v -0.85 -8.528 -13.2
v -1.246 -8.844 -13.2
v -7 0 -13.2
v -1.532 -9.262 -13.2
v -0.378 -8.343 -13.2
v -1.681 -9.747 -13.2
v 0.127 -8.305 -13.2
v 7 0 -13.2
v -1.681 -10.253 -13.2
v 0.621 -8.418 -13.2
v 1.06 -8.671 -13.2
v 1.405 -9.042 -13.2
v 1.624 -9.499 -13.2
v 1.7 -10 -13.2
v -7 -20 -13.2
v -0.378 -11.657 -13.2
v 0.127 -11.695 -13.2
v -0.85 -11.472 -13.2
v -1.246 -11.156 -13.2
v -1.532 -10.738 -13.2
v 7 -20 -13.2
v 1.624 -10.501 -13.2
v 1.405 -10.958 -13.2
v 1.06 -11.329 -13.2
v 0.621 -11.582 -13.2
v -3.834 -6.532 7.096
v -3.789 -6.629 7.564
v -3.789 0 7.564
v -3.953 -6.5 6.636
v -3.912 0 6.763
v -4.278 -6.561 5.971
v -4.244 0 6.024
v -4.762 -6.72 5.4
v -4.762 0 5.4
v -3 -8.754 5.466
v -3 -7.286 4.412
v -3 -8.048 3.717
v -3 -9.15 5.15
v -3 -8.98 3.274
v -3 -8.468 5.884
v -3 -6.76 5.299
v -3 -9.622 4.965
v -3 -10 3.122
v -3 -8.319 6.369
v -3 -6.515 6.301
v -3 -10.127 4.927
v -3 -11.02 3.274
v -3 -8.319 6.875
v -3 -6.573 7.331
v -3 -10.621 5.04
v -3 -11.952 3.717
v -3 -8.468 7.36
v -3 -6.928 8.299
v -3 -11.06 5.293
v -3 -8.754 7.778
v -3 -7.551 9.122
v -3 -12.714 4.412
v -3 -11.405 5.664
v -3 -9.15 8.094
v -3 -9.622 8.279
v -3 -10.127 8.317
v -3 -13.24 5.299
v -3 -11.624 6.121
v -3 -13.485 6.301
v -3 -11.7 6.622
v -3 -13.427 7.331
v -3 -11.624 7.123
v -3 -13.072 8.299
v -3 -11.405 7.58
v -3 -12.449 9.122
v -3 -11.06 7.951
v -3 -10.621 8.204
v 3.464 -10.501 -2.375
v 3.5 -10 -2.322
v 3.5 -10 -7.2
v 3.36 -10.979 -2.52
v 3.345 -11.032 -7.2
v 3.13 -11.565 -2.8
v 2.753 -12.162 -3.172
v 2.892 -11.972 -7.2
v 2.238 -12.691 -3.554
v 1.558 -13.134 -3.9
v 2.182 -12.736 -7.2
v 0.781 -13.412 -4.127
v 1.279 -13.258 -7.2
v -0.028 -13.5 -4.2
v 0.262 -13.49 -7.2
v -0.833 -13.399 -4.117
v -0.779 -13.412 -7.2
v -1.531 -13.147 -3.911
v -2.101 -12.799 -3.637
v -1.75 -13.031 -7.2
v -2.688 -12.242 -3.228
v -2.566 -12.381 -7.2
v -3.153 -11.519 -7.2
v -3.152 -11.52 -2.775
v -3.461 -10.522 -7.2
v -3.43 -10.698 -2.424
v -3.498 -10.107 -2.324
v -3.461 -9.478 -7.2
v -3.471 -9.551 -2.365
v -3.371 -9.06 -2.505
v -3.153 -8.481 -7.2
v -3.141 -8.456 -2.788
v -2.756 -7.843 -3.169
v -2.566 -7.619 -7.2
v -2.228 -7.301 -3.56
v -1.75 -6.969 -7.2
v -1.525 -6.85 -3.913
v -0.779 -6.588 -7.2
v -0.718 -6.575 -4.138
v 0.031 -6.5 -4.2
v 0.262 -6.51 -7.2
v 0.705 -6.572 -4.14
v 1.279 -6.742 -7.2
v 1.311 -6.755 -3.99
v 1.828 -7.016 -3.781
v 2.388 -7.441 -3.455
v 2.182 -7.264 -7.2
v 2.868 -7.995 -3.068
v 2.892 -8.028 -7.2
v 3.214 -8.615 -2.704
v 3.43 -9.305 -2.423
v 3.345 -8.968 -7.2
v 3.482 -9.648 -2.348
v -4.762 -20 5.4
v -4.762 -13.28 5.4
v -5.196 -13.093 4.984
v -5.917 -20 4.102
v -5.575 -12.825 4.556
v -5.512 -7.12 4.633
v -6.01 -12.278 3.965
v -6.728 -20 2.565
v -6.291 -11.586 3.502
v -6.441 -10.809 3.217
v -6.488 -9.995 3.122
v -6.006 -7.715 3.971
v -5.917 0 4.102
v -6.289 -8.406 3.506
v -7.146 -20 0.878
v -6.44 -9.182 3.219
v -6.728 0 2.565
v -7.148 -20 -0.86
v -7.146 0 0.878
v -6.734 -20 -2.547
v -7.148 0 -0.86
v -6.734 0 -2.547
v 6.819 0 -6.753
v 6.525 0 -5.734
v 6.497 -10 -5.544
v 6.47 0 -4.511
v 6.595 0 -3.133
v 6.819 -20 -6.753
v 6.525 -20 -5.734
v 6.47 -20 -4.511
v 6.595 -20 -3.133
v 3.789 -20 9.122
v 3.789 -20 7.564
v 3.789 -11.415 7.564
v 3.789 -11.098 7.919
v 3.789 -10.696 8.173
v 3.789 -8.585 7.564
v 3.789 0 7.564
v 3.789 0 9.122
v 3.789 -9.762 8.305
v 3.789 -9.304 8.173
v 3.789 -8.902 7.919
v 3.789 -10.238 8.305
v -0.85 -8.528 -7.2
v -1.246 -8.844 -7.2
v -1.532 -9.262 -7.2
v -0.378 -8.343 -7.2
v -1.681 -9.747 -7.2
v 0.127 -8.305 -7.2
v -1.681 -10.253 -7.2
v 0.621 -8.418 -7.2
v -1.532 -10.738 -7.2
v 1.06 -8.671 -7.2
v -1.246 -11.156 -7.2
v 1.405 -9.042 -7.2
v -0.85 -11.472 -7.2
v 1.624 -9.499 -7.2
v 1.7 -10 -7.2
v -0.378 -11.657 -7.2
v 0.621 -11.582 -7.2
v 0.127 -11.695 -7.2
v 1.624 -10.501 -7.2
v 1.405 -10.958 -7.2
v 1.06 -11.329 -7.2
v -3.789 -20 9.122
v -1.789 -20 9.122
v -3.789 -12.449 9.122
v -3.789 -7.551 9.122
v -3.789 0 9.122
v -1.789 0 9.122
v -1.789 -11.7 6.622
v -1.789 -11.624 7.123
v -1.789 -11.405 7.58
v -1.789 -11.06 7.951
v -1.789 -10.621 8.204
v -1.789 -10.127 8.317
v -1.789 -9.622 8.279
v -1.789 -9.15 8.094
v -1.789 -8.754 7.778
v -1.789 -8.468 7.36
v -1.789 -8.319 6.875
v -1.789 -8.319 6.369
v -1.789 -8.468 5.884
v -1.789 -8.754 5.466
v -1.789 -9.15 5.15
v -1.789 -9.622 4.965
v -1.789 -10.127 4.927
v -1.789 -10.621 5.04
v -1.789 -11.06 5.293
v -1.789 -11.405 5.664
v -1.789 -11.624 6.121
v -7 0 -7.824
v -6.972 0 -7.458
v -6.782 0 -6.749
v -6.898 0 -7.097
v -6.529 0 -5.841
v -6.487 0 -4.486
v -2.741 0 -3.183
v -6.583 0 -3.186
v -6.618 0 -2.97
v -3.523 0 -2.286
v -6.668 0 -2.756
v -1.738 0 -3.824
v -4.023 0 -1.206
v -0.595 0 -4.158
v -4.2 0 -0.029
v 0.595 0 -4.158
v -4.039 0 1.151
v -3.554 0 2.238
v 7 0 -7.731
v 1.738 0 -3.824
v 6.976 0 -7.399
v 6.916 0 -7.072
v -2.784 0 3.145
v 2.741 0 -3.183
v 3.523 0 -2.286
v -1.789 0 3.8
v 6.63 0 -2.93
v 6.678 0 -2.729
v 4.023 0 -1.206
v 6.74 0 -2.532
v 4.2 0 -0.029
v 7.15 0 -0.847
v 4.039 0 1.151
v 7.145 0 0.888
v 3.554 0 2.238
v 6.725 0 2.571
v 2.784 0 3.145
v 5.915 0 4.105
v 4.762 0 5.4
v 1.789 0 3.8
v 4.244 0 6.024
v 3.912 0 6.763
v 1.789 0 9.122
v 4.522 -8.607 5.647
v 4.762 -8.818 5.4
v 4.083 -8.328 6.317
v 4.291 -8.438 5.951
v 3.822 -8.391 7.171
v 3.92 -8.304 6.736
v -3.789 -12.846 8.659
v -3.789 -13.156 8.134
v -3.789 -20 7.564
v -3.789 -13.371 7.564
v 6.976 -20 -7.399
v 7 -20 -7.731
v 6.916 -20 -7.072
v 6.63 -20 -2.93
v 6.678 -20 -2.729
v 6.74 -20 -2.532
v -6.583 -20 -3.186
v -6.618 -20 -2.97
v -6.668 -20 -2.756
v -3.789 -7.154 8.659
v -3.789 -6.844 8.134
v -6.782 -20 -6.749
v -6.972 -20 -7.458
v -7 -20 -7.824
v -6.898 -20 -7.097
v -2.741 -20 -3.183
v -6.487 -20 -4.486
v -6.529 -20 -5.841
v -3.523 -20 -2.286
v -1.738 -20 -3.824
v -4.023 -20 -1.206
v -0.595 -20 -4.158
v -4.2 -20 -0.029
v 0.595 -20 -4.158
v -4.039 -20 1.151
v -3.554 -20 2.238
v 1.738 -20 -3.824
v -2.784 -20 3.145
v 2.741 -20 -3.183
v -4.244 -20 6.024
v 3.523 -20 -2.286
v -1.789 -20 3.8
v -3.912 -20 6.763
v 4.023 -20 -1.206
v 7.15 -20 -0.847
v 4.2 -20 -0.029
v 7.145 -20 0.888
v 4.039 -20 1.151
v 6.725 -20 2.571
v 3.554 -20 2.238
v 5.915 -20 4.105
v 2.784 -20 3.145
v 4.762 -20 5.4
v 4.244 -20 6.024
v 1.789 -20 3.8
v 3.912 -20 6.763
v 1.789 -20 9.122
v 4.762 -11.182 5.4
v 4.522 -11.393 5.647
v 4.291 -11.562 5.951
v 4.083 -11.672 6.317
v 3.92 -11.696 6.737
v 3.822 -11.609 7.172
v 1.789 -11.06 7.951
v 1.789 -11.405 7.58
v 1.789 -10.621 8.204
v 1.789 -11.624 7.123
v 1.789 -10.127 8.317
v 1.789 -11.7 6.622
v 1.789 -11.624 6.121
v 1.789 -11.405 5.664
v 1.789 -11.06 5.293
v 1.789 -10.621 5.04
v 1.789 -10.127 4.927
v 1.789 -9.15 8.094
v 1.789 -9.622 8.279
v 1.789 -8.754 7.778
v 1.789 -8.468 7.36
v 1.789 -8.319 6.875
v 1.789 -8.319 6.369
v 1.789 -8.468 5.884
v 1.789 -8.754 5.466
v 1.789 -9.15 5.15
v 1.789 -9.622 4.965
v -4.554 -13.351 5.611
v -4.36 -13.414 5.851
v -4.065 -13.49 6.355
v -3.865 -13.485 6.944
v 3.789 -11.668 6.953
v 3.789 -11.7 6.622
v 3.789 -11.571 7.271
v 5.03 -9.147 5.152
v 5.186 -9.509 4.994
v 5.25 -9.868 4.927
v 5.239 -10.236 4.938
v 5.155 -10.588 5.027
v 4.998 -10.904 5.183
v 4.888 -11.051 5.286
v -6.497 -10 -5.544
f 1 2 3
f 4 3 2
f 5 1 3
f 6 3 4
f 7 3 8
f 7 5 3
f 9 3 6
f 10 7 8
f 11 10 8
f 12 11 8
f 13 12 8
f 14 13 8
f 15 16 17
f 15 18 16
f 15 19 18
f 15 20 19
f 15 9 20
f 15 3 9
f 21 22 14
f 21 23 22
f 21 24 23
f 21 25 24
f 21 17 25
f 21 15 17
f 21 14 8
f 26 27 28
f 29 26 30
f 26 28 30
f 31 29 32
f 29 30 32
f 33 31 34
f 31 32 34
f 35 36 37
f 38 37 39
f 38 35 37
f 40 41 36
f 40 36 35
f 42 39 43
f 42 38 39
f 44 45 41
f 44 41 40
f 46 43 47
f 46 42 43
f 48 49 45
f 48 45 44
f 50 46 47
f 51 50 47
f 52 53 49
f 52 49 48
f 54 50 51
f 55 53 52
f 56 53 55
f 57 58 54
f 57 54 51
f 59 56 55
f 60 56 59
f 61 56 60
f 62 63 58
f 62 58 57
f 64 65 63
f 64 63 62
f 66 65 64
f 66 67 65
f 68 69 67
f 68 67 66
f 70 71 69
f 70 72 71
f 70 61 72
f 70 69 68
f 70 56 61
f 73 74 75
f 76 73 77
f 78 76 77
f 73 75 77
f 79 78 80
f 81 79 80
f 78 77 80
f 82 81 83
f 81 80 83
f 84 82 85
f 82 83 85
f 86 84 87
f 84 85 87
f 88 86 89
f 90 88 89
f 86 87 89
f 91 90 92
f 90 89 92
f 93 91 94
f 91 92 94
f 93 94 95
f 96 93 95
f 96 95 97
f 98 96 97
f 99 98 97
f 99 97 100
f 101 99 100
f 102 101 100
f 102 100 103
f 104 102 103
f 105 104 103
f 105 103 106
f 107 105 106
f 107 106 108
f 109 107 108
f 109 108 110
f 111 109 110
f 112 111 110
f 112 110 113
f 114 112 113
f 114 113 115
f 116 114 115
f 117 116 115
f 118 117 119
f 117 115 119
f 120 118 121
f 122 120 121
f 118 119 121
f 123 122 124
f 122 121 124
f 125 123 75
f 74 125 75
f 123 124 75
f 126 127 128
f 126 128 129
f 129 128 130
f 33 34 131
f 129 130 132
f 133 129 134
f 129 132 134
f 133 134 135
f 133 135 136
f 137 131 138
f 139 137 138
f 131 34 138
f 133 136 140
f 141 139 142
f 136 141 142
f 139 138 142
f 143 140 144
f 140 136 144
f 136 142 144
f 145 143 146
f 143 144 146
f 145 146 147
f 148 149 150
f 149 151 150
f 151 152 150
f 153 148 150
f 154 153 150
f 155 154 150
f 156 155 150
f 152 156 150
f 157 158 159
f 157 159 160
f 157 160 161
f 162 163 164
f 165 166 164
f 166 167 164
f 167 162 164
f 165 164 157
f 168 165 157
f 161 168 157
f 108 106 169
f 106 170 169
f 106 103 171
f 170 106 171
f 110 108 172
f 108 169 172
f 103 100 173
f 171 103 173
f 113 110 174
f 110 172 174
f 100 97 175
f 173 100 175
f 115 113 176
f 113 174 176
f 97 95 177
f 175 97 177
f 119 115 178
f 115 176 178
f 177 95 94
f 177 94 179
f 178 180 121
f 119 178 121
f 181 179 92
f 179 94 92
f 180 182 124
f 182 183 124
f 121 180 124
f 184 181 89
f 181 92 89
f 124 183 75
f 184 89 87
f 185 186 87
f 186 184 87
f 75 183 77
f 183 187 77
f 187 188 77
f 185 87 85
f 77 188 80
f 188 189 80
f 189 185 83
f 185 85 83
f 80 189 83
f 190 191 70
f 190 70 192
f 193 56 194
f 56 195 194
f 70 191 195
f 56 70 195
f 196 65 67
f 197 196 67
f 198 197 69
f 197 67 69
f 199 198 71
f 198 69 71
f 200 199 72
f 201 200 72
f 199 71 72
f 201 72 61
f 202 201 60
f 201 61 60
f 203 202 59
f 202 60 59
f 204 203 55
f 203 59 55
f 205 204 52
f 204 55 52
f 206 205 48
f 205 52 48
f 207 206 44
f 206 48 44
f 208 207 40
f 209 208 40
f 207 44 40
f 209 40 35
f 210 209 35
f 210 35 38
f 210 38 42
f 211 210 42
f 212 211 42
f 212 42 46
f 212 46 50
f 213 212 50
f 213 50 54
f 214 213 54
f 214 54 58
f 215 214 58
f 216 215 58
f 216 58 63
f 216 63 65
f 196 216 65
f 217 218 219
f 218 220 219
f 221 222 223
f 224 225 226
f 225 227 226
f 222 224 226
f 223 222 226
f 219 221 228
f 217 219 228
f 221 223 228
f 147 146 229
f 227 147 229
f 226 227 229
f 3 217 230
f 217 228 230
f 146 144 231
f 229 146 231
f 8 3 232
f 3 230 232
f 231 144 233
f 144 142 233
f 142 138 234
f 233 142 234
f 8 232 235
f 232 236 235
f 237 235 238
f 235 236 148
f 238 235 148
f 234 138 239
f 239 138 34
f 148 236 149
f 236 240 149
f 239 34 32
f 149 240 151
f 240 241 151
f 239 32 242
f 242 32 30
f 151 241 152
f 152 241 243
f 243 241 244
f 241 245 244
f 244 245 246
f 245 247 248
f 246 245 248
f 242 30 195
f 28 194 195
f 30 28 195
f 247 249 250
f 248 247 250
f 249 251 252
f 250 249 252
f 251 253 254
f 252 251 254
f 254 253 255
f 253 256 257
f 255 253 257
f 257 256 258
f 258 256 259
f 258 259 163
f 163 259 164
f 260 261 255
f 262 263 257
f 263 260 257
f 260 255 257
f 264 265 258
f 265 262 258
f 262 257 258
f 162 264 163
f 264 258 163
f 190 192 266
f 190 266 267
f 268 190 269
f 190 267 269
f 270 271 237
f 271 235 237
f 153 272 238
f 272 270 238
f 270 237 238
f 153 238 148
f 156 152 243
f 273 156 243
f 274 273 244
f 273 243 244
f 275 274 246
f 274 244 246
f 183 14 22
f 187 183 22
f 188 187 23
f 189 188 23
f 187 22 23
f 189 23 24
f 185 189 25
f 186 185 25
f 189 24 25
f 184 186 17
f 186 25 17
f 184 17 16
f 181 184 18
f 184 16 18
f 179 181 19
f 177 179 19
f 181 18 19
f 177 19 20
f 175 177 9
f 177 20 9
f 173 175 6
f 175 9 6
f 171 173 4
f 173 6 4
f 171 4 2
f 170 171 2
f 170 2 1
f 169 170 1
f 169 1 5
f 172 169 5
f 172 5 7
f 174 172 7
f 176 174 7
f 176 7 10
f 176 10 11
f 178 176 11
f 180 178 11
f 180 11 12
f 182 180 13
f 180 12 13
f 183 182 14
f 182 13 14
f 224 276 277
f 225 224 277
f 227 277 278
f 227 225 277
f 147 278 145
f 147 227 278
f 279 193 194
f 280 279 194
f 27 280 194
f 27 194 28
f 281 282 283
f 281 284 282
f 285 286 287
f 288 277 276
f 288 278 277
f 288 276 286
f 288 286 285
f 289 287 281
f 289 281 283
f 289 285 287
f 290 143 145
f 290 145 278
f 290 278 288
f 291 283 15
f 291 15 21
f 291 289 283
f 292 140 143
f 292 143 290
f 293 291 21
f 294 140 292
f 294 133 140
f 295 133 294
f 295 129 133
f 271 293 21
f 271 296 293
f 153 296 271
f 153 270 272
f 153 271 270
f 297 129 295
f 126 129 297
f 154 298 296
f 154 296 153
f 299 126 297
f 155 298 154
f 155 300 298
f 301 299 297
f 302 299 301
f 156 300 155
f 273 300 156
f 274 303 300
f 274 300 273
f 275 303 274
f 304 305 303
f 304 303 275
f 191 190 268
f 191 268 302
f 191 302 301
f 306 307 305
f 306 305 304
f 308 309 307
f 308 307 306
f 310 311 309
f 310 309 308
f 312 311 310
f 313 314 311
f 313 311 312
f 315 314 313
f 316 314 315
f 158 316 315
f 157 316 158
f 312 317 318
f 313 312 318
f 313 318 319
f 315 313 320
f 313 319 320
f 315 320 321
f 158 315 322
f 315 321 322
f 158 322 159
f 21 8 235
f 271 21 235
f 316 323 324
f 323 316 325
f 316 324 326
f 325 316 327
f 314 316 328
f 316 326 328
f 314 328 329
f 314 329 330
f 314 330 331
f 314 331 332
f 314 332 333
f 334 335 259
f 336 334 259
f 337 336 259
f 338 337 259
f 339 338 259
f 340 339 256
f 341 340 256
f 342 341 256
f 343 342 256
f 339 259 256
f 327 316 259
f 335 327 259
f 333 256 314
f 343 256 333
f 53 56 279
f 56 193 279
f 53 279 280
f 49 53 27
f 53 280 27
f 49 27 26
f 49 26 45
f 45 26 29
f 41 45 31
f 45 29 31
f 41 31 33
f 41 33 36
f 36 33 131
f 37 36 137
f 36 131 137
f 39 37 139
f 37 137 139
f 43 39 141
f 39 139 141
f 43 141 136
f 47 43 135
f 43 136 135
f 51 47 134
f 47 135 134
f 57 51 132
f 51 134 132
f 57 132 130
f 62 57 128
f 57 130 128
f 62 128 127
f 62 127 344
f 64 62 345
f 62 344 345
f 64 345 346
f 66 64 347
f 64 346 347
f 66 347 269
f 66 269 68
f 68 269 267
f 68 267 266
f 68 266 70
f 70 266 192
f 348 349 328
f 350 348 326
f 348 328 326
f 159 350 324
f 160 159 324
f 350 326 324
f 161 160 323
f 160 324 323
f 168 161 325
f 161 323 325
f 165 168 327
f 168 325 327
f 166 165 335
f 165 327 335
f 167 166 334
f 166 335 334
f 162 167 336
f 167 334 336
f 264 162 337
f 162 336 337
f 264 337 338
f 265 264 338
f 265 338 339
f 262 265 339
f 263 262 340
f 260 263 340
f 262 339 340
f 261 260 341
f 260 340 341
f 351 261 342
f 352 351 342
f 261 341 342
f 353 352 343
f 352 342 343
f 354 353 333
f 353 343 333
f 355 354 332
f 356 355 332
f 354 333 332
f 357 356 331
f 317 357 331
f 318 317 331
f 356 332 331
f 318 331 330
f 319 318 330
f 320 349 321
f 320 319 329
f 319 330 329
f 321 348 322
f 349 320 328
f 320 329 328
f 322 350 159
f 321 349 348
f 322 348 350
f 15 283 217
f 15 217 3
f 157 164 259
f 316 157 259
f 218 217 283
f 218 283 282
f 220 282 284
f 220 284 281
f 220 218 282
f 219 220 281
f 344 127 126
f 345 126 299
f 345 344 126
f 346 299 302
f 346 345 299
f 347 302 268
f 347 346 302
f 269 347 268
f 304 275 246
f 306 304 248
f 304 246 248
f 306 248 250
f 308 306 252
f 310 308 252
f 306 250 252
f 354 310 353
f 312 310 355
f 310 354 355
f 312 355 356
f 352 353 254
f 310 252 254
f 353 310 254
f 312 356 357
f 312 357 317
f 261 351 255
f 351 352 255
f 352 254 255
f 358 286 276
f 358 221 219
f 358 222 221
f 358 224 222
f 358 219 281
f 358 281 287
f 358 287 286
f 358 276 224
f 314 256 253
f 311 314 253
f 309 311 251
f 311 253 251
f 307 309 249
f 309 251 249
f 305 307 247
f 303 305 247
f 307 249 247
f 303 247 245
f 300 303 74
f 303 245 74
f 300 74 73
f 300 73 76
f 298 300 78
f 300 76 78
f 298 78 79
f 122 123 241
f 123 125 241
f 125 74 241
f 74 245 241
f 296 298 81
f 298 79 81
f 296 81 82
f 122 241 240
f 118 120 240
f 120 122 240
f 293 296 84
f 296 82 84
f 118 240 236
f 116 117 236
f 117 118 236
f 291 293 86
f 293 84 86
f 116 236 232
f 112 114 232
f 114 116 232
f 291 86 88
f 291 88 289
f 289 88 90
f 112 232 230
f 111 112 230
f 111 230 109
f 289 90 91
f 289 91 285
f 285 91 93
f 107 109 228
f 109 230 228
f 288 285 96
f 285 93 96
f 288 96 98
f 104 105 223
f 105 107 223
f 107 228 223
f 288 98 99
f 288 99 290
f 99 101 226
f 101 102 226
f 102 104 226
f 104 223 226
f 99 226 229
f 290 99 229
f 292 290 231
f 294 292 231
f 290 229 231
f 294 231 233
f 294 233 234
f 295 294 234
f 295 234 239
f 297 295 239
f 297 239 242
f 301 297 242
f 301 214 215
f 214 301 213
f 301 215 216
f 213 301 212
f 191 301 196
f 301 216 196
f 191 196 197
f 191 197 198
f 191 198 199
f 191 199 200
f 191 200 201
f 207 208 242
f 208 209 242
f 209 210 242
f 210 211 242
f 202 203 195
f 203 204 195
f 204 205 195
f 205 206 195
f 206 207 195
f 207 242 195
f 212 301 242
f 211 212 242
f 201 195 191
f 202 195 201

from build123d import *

# Parameters (mm, degrees)
F1_DEPTH     = 20
F2_R         = 3.5
F2_R_2       = 1.7
F3_DEPTH     = 4
F4_DEPTH     = 25
F5_T1_DEPTH  = 20
F5_T6_DEPTH  = 12.1022846539
F5_S7_R      = 1.7
F5_T8_DEPTH  = 8
F5_T12_DEPTH = 12.1022846539
F5_S13_R     = 1.7
F5_T14_DEPTH = 8
F5_T18_DEPTH = 10.2630041323
F5_S19_R     = 3.5
F5_T20_DEPTH = 7
F5_T24_DEPTH = 10.2630041323
F5_S25_R     = 3.5
F5_T26_DEPTH = 7
F5_T27_DEPTH = 23.3663915102
F5_T29_DEPTH = 22.9020360067
F6_R         = 3.5
F6_R_2       = 1.7
F7_DEPTH     = 12
F8_DEPTH     = 12
F9_DEPTH     = 6


# Not quite as in the source:
# - a fillet or chamfer that OpenCascade refuses, or shapes differently, is made with other operations: its cross-section is extruded or revolved along the edge and cut away or added


with BuildPart() as f1:
    # F0 (on Front) → F1 (new body)
    with BuildSketch(Plane.XZ):
        with BuildLine():
            ThreePointArc((1.7894736842, 3.7997084011), (0, -4.2), (-1.7894736842, 3.7997084011))
            Line((-1.7894736842, 3.7997084011), (-1.7894736842, 9.1220820965))
            Line((-1.7894736842, 9.1220820965), (-3.7894736842, 9.1220820965))
            Line((-3.7894736842, 9.1220820965), (-3.7894736842, 6.1220820965))
            ThreePointArc((-3.7894736842, 6.1220820965), (-6.8557776995, 2.199616361), (-6.6439040907, -2.7746240166))
            add(Edge.make_bspline(
                [(-6.6356726702, -2.7942527112), (-6.6390399212, -2.7803089062), (-6.6413283577, -2.7774058988), (-6.6439040907, -2.7746240166)],
                knots=[0.9532514843, 0.9532514843, 0.9532514843, 0.9532514843, 1, 1, 1, 1], degree=3))
            add(Edge.make_bspline(
                [(-7, -7.2), (-6.7795680226, -6.7700727801), (-6.2785456929, -5.7974600377), (-6.5973790049, -2.9528269921), (-6.6356726702, -2.7942527112)],
                knots=[0, 0, 0, 0, 0.4216094964, 0.9532514843, 0.9532514843, 0.9532514843, 0.9532514843], degree=3))
            Line((-7, -7.2), (-7, -13.2))
            Line((-7, -13.2), (7, -13.2))
            Line((7, -13.2), (7, -7.2))
            add(Edge.make_bspline(
                [(7, -7.2), (6.7871491537, -6.6864508711), (6.3058923114, -5.5253136877), (6.5175995563, -3.7720698099), (6.6356726702, -2.7942527112)],
                knots=[0, 0, 0, 0, 0.4422811845, 1, 1, 1, 1], degree=3))
            ThreePointArc((6.6356726702, -2.7942527112), (6.8590214848, 2.1894803656), (3.7894736842, 6.1220820965))
            Line((3.7894736842, 6.1220820965), (3.7894736842, 9.1220820965))
            Line((3.7894736842, 9.1220820965), (1.7894736842, 9.1220820965))
            Line((1.7894736842, 9.1220820965), (1.7894736842, 3.7997084011))
        make_face()
        with BuildLine():
            add(Edge.make_bspline(
                [(-6.6356726702, -2.7942527112), (-6.6390399212, -2.7803089062), (-6.6413283577, -2.7774058988), (-6.6439040907, -2.7746240166)],
                knots=[0.9532514843, 0.9532514843, 0.9532514843, 0.9532514843, 1, 1, 1, 1], degree=3))
            ThreePointArc((-6.6439040907, -2.7746240166), (-6.6397956338, -2.7844414056), (-6.6356726702, -2.7942527112))
        make_face()
    extrude(amount=F1_DEPTH)

    # F2 (on face) → F3 (cut)
    with BuildSketch(Plane(origin=(-7, 0, 0), x_dir=(0, -1, 0), z_dir=(-1, 0, 0))):
        with Locations((10, 6.622)):
            Circle(F2_R)
        with Locations((10, 6.622)):
            Circle(F2_R_2, mode=Mode.SUBTRACT)
    extrude(amount=-F3_DEPTH, mode=Mode.SUBTRACT)

    # F2 (on face) → F4 (cut)
    with BuildSketch(Plane(origin=(-7, 0, 0), x_dir=(0, -1, 0), z_dir=(-1, 0, 0))):
        with Locations((10, 6.622)):
            Circle(F2_R_2)
    extrude(amount=-F4_DEPTH, mode=Mode.SUBTRACT)

    # F5: fillet of radius 3 on 8 edges, made by hand

    # F5_s2 → F5_t1 (join)
    with BuildSketch(Plane.XZ):
        with BuildLine():
            ThreePointArc((-6.5767127025, -3.2402461743), (-6.6395606645, -2.8691274316), (-6.7483493849, -2.5087886996))
            Line((-6.7483493849, -2.5087886996), (-6.466927581, -2.4041663985))
            ThreePointArc((-6.466927581, -2.4041663985), (-6.4145893512, -2.5416001874), (-6.3589651198, -2.6777323732))
            Line((-6.3589651198, -2.6777323732), (-6.343821894, -2.723774473))
            ThreePointArc((-6.343821894, -2.723774473), (-6.304537605, -2.9799785061), (-6.2781272304, -3.2087696206))
            Line((-6.2781272304, -3.2087696206), (-6.5767127025, -3.2402461743))
        make_face()
        with BuildLine():
            ThreePointArc((6.5887317904, -3.1834061265), (6.6509501418, -2.8334452349), (6.754091056, -2.4932898281))
            Line((6.754091056, -2.4932898281), (6.4724298111, -2.3893138658))
            ThreePointArc((6.4724298111, -2.3893138658), (6.4175024363, -2.534235691), (6.3589651198, -2.6777323732))
            Line((6.3589651198, -2.6777323732), (6.3375979172, -2.7582596669))
            ThreePointArc((6.3375979172, -2.7582596669), (6.3141276632, -2.9530960278), (6.290534619, -3.1484417941))
            Line((6.290534619, -3.1484417941), (6.5887317904, -3.1834061265))
        make_face()
    extrude(amount=F5_T1_DEPTH)


with BuildPart() as f5_tool4:
    # F5_s5 → F5_t6 (new body)
    with BuildSketch(Plane.XZ.offset(7.8977153461)):
        with BuildLine():
            ThreePointArc((4.792775332, 5.3724803189), (4.0514647707, 6.385428811), (3.7890736842, 7.6129290813))
            Line((3.7890736842, 7.6129290813), (3.4888336842, 7.6129290813))
            ThreePointArc((3.4888336842, 7.6129290813), (3.4892336842, 6.8675055889), (3.4892336842, 6.1220820965))
            Line((3.4892336842, 6.1220820965), (3.6314526316, 5.8667912731))
            ThreePointArc((3.6314526316, 5.8667912731), (4.1279416848, 5.5287236777), (4.5929054968, 5.1484354427))
            Line((4.5929054968, 5.1484354427), (4.792775332, 5.3724803189))
        make_face()
    extrude(amount=F5_T6_DEPTH)

    # F5_s7 → F5_t8 (cut, symmetric)
    with BuildSketch(Plane.YZ.offset(4.1)):
        with Locations((-10, 6.622)):
            Circle(F5_S7_R)
    extrude(amount=F5_T8_DEPTH, both=True, mode=Mode.SUBTRACT)


with BuildPart() as f1_1:
    add(f1.part)

    # F5_t3: union F5_tool4
    add(f5_tool4.part)


with BuildPart() as f5_tool10:
    # F5_s11 → F5_t12 (new body)
    with BuildSketch(Plane.XZ):
        with BuildLine():
            ThreePointArc((4.792775332, 5.3724803189), (4.0514647707, 6.385428811), (3.7890736842, 7.6129290813))
            Line((3.7890736842, 7.6129290813), (3.4888336842, 7.6129290813))
            ThreePointArc((3.4888336842, 7.6129290813), (3.4892336842, 6.8675055889), (3.4892336842, 6.1220820965))
            Line((3.4892336842, 6.1220820965), (3.6314526316, 5.8667912731))
            ThreePointArc((3.6314526316, 5.8667912731), (4.1279416848, 5.5287236777), (4.5929054968, 5.1484354427))
            Line((4.5929054968, 5.1484354427), (4.792775332, 5.3724803189))
        make_face()
    extrude(amount=F5_T12_DEPTH)

    # F5_s13 → F5_t14 (cut, symmetric)
    with BuildSketch(Plane.YZ.offset(4.1)):
        with Locations((-10, 6.622)):
            Circle(F5_S13_R)
    extrude(amount=F5_T14_DEPTH, both=True, mode=Mode.SUBTRACT)


with BuildPart() as f1_2:
    add(f1_1.part)

    # F5_t9: union F5_tool10
    add(f5_tool10.part)


with BuildPart() as f5_tool16:
    # F5_s17 → F5_t18 (new body)
    with BuildSketch(Plane.XZ):
        with BuildLine():
            ThreePointArc((-3.7890736842, 7.6129290813), (-4.0514647707, 6.385428811), (-4.792775332, 5.3724803189))
            Line((-4.792775332, 5.3724803189), (-4.5929054968, 5.1484354427))
            ThreePointArc((-4.5929054968, 5.1484354427), (-4.1279416848, 5.5287236777), (-3.6314526316, 5.8667912731))
            Line((-3.6314526316, 5.8667912731), (-3.4892336842, 6.1220820965))
            ThreePointArc((-3.4892336842, 6.1220820965), (-3.4892336842, 6.8675055889), (-3.4888336842, 7.6129290813))
            Line((-3.4888336842, 7.6129290813), (-3.7890736842, 7.6129290813))
        make_face()
    extrude(amount=F5_T18_DEPTH)

    # F5_s19 → F5_t20 (cut, symmetric)
    with BuildSketch(Plane.YZ.offset(-4.1)):
        with Locations((-10, 6.622)):
            Circle(F5_S19_R)
    extrude(amount=F5_T20_DEPTH, both=True, mode=Mode.SUBTRACT)


with BuildPart() as f1_3:
    add(f1_2.part)

    # F5_t15: union F5_tool16
    add(f5_tool16.part)


with BuildPart() as f5_tool22:
    # F5_s23 → F5_t24 (new body)
    with BuildSketch(Plane.XZ.offset(9.7369958677)):
        with BuildLine():
            ThreePointArc((-4.792775332, 5.3724803189), (-4.0514647707, 6.385428811), (-3.7890736842, 7.6129290813))
            Line((-3.7890736842, 7.6129290813), (-3.4888336842, 7.6129290813))
            ThreePointArc((-3.4888336842, 7.6129290813), (-3.4892336842, 6.8675055889), (-3.4892336842, 6.1220820965))
            Line((-3.4892336842, 6.1220820965), (-3.6314526316, 5.8667912731))
            ThreePointArc((-3.6314526316, 5.8667912731), (-4.1279416848, 5.5287236777), (-4.5929054968, 5.1484354427))
            Line((-4.5929054968, 5.1484354427), (-4.792775332, 5.3724803189))
        make_face()
    extrude(amount=F5_T24_DEPTH)

    # F5_s25 → F5_t26 (cut, symmetric)
    with BuildSketch(Plane.YZ.offset(-4.1)):
        with Locations((-10, 6.622)):
            Circle(F5_S25_R)
    extrude(amount=F5_T26_DEPTH, both=True, mode=Mode.SUBTRACT)


with BuildPart() as f1_4:
    add(f1_3.part)

    # F5_t21: union F5_tool22
    add(f5_tool22.part)

    # F5_s28 → F5_t27 (cut)
    with BuildSketch(Plane.XZ.offset(-1.6831957551)):
        with BuildLine():
            ThreePointArc((-7.0004, -7.8732781832), (-6.9416848839, -7.2824101234), (-6.7678360085, -6.7146521667))
            Line((-6.7678360085, -6.7146521667), (-7.0448196093, -6.5987895651))
            ThreePointArc((-7.0448196093, -6.5987895651), (-7.148871707, -6.8283644641), (-7.2671697753, -7.0630169034))
            Line((-7.2671697753, -7.0630169034), (-7.30024, -7.2))
            ThreePointArc((-7.30024, -7.2), (-7.30024, -7.5366390916), (-7.30064, -7.8732781832))
            Line((-7.30064, -7.8732781832), (-7.0004, -7.8732781832))
        make_face()
    extrude(amount=F5_T27_DEPTH, mode=Mode.SUBTRACT)

    # F5_s30 → F5_t29 (cut)
    with BuildSketch(Plane.XZ.offset(-1.4510180034)):
        with BuildLine():
            ThreePointArc((7.0004, -7.7804070635), (6.9510099307, -7.2380620544), (6.8044646756, -6.7135604089))
            Line((6.8044646756, -6.7135604089), (7.0851111432, -6.6068757434))
            ThreePointArc((7.0851111432, -6.6068757434), (7.178454263, -6.8447161783), (7.277360411, -7.0850423555))
            Line((7.277360411, -7.0850423555), (7.30024, -7.2))
            ThreePointArc((7.30024, -7.2), (7.30024, -7.4902035318), (7.30064, -7.7804070635))
            Line((7.30064, -7.7804070635), (7.0004, -7.7804070635))
        make_face()
    extrude(amount=F5_T29_DEPTH, mode=Mode.SUBTRACT)

    # F6 (on face) → F7 (cut)
    with BuildSketch(Plane(origin=(0, 0, -13.2), x_dir=(1, 0, 0), z_dir=(0, 0, -1))):
        with Locations((0, 10)):
            Circle(F6_R)
        with Locations((0, 10)):
            Circle(F6_R_2, mode=Mode.SUBTRACT)
    extrude(amount=-F7_DEPTH, mode=Mode.SUBTRACT)

    # F8 (cut): a face of the model
    f8_faces = [f1_4.faces().sort_by_distance(p)[0] for p in [
        (0, -10, -13.2),
    ]]
    extrude(f8_faces, amount=-F8_DEPTH, mode=Mode.SUBTRACT)

    # F6 (on face) → F9 (join)
    with BuildSketch(Plane(origin=(0, 0, -13.2), x_dir=(1, 0, 0), z_dir=(0, 0, -1))):
        with Locations((0, 10)):
            Circle(F6_R)
        with Locations((0, 10)):
            Circle(F6_R_2, mode=Mode.SUBTRACT)
    extrude(amount=-F9_DEPTH)


solid = f1_4.part
